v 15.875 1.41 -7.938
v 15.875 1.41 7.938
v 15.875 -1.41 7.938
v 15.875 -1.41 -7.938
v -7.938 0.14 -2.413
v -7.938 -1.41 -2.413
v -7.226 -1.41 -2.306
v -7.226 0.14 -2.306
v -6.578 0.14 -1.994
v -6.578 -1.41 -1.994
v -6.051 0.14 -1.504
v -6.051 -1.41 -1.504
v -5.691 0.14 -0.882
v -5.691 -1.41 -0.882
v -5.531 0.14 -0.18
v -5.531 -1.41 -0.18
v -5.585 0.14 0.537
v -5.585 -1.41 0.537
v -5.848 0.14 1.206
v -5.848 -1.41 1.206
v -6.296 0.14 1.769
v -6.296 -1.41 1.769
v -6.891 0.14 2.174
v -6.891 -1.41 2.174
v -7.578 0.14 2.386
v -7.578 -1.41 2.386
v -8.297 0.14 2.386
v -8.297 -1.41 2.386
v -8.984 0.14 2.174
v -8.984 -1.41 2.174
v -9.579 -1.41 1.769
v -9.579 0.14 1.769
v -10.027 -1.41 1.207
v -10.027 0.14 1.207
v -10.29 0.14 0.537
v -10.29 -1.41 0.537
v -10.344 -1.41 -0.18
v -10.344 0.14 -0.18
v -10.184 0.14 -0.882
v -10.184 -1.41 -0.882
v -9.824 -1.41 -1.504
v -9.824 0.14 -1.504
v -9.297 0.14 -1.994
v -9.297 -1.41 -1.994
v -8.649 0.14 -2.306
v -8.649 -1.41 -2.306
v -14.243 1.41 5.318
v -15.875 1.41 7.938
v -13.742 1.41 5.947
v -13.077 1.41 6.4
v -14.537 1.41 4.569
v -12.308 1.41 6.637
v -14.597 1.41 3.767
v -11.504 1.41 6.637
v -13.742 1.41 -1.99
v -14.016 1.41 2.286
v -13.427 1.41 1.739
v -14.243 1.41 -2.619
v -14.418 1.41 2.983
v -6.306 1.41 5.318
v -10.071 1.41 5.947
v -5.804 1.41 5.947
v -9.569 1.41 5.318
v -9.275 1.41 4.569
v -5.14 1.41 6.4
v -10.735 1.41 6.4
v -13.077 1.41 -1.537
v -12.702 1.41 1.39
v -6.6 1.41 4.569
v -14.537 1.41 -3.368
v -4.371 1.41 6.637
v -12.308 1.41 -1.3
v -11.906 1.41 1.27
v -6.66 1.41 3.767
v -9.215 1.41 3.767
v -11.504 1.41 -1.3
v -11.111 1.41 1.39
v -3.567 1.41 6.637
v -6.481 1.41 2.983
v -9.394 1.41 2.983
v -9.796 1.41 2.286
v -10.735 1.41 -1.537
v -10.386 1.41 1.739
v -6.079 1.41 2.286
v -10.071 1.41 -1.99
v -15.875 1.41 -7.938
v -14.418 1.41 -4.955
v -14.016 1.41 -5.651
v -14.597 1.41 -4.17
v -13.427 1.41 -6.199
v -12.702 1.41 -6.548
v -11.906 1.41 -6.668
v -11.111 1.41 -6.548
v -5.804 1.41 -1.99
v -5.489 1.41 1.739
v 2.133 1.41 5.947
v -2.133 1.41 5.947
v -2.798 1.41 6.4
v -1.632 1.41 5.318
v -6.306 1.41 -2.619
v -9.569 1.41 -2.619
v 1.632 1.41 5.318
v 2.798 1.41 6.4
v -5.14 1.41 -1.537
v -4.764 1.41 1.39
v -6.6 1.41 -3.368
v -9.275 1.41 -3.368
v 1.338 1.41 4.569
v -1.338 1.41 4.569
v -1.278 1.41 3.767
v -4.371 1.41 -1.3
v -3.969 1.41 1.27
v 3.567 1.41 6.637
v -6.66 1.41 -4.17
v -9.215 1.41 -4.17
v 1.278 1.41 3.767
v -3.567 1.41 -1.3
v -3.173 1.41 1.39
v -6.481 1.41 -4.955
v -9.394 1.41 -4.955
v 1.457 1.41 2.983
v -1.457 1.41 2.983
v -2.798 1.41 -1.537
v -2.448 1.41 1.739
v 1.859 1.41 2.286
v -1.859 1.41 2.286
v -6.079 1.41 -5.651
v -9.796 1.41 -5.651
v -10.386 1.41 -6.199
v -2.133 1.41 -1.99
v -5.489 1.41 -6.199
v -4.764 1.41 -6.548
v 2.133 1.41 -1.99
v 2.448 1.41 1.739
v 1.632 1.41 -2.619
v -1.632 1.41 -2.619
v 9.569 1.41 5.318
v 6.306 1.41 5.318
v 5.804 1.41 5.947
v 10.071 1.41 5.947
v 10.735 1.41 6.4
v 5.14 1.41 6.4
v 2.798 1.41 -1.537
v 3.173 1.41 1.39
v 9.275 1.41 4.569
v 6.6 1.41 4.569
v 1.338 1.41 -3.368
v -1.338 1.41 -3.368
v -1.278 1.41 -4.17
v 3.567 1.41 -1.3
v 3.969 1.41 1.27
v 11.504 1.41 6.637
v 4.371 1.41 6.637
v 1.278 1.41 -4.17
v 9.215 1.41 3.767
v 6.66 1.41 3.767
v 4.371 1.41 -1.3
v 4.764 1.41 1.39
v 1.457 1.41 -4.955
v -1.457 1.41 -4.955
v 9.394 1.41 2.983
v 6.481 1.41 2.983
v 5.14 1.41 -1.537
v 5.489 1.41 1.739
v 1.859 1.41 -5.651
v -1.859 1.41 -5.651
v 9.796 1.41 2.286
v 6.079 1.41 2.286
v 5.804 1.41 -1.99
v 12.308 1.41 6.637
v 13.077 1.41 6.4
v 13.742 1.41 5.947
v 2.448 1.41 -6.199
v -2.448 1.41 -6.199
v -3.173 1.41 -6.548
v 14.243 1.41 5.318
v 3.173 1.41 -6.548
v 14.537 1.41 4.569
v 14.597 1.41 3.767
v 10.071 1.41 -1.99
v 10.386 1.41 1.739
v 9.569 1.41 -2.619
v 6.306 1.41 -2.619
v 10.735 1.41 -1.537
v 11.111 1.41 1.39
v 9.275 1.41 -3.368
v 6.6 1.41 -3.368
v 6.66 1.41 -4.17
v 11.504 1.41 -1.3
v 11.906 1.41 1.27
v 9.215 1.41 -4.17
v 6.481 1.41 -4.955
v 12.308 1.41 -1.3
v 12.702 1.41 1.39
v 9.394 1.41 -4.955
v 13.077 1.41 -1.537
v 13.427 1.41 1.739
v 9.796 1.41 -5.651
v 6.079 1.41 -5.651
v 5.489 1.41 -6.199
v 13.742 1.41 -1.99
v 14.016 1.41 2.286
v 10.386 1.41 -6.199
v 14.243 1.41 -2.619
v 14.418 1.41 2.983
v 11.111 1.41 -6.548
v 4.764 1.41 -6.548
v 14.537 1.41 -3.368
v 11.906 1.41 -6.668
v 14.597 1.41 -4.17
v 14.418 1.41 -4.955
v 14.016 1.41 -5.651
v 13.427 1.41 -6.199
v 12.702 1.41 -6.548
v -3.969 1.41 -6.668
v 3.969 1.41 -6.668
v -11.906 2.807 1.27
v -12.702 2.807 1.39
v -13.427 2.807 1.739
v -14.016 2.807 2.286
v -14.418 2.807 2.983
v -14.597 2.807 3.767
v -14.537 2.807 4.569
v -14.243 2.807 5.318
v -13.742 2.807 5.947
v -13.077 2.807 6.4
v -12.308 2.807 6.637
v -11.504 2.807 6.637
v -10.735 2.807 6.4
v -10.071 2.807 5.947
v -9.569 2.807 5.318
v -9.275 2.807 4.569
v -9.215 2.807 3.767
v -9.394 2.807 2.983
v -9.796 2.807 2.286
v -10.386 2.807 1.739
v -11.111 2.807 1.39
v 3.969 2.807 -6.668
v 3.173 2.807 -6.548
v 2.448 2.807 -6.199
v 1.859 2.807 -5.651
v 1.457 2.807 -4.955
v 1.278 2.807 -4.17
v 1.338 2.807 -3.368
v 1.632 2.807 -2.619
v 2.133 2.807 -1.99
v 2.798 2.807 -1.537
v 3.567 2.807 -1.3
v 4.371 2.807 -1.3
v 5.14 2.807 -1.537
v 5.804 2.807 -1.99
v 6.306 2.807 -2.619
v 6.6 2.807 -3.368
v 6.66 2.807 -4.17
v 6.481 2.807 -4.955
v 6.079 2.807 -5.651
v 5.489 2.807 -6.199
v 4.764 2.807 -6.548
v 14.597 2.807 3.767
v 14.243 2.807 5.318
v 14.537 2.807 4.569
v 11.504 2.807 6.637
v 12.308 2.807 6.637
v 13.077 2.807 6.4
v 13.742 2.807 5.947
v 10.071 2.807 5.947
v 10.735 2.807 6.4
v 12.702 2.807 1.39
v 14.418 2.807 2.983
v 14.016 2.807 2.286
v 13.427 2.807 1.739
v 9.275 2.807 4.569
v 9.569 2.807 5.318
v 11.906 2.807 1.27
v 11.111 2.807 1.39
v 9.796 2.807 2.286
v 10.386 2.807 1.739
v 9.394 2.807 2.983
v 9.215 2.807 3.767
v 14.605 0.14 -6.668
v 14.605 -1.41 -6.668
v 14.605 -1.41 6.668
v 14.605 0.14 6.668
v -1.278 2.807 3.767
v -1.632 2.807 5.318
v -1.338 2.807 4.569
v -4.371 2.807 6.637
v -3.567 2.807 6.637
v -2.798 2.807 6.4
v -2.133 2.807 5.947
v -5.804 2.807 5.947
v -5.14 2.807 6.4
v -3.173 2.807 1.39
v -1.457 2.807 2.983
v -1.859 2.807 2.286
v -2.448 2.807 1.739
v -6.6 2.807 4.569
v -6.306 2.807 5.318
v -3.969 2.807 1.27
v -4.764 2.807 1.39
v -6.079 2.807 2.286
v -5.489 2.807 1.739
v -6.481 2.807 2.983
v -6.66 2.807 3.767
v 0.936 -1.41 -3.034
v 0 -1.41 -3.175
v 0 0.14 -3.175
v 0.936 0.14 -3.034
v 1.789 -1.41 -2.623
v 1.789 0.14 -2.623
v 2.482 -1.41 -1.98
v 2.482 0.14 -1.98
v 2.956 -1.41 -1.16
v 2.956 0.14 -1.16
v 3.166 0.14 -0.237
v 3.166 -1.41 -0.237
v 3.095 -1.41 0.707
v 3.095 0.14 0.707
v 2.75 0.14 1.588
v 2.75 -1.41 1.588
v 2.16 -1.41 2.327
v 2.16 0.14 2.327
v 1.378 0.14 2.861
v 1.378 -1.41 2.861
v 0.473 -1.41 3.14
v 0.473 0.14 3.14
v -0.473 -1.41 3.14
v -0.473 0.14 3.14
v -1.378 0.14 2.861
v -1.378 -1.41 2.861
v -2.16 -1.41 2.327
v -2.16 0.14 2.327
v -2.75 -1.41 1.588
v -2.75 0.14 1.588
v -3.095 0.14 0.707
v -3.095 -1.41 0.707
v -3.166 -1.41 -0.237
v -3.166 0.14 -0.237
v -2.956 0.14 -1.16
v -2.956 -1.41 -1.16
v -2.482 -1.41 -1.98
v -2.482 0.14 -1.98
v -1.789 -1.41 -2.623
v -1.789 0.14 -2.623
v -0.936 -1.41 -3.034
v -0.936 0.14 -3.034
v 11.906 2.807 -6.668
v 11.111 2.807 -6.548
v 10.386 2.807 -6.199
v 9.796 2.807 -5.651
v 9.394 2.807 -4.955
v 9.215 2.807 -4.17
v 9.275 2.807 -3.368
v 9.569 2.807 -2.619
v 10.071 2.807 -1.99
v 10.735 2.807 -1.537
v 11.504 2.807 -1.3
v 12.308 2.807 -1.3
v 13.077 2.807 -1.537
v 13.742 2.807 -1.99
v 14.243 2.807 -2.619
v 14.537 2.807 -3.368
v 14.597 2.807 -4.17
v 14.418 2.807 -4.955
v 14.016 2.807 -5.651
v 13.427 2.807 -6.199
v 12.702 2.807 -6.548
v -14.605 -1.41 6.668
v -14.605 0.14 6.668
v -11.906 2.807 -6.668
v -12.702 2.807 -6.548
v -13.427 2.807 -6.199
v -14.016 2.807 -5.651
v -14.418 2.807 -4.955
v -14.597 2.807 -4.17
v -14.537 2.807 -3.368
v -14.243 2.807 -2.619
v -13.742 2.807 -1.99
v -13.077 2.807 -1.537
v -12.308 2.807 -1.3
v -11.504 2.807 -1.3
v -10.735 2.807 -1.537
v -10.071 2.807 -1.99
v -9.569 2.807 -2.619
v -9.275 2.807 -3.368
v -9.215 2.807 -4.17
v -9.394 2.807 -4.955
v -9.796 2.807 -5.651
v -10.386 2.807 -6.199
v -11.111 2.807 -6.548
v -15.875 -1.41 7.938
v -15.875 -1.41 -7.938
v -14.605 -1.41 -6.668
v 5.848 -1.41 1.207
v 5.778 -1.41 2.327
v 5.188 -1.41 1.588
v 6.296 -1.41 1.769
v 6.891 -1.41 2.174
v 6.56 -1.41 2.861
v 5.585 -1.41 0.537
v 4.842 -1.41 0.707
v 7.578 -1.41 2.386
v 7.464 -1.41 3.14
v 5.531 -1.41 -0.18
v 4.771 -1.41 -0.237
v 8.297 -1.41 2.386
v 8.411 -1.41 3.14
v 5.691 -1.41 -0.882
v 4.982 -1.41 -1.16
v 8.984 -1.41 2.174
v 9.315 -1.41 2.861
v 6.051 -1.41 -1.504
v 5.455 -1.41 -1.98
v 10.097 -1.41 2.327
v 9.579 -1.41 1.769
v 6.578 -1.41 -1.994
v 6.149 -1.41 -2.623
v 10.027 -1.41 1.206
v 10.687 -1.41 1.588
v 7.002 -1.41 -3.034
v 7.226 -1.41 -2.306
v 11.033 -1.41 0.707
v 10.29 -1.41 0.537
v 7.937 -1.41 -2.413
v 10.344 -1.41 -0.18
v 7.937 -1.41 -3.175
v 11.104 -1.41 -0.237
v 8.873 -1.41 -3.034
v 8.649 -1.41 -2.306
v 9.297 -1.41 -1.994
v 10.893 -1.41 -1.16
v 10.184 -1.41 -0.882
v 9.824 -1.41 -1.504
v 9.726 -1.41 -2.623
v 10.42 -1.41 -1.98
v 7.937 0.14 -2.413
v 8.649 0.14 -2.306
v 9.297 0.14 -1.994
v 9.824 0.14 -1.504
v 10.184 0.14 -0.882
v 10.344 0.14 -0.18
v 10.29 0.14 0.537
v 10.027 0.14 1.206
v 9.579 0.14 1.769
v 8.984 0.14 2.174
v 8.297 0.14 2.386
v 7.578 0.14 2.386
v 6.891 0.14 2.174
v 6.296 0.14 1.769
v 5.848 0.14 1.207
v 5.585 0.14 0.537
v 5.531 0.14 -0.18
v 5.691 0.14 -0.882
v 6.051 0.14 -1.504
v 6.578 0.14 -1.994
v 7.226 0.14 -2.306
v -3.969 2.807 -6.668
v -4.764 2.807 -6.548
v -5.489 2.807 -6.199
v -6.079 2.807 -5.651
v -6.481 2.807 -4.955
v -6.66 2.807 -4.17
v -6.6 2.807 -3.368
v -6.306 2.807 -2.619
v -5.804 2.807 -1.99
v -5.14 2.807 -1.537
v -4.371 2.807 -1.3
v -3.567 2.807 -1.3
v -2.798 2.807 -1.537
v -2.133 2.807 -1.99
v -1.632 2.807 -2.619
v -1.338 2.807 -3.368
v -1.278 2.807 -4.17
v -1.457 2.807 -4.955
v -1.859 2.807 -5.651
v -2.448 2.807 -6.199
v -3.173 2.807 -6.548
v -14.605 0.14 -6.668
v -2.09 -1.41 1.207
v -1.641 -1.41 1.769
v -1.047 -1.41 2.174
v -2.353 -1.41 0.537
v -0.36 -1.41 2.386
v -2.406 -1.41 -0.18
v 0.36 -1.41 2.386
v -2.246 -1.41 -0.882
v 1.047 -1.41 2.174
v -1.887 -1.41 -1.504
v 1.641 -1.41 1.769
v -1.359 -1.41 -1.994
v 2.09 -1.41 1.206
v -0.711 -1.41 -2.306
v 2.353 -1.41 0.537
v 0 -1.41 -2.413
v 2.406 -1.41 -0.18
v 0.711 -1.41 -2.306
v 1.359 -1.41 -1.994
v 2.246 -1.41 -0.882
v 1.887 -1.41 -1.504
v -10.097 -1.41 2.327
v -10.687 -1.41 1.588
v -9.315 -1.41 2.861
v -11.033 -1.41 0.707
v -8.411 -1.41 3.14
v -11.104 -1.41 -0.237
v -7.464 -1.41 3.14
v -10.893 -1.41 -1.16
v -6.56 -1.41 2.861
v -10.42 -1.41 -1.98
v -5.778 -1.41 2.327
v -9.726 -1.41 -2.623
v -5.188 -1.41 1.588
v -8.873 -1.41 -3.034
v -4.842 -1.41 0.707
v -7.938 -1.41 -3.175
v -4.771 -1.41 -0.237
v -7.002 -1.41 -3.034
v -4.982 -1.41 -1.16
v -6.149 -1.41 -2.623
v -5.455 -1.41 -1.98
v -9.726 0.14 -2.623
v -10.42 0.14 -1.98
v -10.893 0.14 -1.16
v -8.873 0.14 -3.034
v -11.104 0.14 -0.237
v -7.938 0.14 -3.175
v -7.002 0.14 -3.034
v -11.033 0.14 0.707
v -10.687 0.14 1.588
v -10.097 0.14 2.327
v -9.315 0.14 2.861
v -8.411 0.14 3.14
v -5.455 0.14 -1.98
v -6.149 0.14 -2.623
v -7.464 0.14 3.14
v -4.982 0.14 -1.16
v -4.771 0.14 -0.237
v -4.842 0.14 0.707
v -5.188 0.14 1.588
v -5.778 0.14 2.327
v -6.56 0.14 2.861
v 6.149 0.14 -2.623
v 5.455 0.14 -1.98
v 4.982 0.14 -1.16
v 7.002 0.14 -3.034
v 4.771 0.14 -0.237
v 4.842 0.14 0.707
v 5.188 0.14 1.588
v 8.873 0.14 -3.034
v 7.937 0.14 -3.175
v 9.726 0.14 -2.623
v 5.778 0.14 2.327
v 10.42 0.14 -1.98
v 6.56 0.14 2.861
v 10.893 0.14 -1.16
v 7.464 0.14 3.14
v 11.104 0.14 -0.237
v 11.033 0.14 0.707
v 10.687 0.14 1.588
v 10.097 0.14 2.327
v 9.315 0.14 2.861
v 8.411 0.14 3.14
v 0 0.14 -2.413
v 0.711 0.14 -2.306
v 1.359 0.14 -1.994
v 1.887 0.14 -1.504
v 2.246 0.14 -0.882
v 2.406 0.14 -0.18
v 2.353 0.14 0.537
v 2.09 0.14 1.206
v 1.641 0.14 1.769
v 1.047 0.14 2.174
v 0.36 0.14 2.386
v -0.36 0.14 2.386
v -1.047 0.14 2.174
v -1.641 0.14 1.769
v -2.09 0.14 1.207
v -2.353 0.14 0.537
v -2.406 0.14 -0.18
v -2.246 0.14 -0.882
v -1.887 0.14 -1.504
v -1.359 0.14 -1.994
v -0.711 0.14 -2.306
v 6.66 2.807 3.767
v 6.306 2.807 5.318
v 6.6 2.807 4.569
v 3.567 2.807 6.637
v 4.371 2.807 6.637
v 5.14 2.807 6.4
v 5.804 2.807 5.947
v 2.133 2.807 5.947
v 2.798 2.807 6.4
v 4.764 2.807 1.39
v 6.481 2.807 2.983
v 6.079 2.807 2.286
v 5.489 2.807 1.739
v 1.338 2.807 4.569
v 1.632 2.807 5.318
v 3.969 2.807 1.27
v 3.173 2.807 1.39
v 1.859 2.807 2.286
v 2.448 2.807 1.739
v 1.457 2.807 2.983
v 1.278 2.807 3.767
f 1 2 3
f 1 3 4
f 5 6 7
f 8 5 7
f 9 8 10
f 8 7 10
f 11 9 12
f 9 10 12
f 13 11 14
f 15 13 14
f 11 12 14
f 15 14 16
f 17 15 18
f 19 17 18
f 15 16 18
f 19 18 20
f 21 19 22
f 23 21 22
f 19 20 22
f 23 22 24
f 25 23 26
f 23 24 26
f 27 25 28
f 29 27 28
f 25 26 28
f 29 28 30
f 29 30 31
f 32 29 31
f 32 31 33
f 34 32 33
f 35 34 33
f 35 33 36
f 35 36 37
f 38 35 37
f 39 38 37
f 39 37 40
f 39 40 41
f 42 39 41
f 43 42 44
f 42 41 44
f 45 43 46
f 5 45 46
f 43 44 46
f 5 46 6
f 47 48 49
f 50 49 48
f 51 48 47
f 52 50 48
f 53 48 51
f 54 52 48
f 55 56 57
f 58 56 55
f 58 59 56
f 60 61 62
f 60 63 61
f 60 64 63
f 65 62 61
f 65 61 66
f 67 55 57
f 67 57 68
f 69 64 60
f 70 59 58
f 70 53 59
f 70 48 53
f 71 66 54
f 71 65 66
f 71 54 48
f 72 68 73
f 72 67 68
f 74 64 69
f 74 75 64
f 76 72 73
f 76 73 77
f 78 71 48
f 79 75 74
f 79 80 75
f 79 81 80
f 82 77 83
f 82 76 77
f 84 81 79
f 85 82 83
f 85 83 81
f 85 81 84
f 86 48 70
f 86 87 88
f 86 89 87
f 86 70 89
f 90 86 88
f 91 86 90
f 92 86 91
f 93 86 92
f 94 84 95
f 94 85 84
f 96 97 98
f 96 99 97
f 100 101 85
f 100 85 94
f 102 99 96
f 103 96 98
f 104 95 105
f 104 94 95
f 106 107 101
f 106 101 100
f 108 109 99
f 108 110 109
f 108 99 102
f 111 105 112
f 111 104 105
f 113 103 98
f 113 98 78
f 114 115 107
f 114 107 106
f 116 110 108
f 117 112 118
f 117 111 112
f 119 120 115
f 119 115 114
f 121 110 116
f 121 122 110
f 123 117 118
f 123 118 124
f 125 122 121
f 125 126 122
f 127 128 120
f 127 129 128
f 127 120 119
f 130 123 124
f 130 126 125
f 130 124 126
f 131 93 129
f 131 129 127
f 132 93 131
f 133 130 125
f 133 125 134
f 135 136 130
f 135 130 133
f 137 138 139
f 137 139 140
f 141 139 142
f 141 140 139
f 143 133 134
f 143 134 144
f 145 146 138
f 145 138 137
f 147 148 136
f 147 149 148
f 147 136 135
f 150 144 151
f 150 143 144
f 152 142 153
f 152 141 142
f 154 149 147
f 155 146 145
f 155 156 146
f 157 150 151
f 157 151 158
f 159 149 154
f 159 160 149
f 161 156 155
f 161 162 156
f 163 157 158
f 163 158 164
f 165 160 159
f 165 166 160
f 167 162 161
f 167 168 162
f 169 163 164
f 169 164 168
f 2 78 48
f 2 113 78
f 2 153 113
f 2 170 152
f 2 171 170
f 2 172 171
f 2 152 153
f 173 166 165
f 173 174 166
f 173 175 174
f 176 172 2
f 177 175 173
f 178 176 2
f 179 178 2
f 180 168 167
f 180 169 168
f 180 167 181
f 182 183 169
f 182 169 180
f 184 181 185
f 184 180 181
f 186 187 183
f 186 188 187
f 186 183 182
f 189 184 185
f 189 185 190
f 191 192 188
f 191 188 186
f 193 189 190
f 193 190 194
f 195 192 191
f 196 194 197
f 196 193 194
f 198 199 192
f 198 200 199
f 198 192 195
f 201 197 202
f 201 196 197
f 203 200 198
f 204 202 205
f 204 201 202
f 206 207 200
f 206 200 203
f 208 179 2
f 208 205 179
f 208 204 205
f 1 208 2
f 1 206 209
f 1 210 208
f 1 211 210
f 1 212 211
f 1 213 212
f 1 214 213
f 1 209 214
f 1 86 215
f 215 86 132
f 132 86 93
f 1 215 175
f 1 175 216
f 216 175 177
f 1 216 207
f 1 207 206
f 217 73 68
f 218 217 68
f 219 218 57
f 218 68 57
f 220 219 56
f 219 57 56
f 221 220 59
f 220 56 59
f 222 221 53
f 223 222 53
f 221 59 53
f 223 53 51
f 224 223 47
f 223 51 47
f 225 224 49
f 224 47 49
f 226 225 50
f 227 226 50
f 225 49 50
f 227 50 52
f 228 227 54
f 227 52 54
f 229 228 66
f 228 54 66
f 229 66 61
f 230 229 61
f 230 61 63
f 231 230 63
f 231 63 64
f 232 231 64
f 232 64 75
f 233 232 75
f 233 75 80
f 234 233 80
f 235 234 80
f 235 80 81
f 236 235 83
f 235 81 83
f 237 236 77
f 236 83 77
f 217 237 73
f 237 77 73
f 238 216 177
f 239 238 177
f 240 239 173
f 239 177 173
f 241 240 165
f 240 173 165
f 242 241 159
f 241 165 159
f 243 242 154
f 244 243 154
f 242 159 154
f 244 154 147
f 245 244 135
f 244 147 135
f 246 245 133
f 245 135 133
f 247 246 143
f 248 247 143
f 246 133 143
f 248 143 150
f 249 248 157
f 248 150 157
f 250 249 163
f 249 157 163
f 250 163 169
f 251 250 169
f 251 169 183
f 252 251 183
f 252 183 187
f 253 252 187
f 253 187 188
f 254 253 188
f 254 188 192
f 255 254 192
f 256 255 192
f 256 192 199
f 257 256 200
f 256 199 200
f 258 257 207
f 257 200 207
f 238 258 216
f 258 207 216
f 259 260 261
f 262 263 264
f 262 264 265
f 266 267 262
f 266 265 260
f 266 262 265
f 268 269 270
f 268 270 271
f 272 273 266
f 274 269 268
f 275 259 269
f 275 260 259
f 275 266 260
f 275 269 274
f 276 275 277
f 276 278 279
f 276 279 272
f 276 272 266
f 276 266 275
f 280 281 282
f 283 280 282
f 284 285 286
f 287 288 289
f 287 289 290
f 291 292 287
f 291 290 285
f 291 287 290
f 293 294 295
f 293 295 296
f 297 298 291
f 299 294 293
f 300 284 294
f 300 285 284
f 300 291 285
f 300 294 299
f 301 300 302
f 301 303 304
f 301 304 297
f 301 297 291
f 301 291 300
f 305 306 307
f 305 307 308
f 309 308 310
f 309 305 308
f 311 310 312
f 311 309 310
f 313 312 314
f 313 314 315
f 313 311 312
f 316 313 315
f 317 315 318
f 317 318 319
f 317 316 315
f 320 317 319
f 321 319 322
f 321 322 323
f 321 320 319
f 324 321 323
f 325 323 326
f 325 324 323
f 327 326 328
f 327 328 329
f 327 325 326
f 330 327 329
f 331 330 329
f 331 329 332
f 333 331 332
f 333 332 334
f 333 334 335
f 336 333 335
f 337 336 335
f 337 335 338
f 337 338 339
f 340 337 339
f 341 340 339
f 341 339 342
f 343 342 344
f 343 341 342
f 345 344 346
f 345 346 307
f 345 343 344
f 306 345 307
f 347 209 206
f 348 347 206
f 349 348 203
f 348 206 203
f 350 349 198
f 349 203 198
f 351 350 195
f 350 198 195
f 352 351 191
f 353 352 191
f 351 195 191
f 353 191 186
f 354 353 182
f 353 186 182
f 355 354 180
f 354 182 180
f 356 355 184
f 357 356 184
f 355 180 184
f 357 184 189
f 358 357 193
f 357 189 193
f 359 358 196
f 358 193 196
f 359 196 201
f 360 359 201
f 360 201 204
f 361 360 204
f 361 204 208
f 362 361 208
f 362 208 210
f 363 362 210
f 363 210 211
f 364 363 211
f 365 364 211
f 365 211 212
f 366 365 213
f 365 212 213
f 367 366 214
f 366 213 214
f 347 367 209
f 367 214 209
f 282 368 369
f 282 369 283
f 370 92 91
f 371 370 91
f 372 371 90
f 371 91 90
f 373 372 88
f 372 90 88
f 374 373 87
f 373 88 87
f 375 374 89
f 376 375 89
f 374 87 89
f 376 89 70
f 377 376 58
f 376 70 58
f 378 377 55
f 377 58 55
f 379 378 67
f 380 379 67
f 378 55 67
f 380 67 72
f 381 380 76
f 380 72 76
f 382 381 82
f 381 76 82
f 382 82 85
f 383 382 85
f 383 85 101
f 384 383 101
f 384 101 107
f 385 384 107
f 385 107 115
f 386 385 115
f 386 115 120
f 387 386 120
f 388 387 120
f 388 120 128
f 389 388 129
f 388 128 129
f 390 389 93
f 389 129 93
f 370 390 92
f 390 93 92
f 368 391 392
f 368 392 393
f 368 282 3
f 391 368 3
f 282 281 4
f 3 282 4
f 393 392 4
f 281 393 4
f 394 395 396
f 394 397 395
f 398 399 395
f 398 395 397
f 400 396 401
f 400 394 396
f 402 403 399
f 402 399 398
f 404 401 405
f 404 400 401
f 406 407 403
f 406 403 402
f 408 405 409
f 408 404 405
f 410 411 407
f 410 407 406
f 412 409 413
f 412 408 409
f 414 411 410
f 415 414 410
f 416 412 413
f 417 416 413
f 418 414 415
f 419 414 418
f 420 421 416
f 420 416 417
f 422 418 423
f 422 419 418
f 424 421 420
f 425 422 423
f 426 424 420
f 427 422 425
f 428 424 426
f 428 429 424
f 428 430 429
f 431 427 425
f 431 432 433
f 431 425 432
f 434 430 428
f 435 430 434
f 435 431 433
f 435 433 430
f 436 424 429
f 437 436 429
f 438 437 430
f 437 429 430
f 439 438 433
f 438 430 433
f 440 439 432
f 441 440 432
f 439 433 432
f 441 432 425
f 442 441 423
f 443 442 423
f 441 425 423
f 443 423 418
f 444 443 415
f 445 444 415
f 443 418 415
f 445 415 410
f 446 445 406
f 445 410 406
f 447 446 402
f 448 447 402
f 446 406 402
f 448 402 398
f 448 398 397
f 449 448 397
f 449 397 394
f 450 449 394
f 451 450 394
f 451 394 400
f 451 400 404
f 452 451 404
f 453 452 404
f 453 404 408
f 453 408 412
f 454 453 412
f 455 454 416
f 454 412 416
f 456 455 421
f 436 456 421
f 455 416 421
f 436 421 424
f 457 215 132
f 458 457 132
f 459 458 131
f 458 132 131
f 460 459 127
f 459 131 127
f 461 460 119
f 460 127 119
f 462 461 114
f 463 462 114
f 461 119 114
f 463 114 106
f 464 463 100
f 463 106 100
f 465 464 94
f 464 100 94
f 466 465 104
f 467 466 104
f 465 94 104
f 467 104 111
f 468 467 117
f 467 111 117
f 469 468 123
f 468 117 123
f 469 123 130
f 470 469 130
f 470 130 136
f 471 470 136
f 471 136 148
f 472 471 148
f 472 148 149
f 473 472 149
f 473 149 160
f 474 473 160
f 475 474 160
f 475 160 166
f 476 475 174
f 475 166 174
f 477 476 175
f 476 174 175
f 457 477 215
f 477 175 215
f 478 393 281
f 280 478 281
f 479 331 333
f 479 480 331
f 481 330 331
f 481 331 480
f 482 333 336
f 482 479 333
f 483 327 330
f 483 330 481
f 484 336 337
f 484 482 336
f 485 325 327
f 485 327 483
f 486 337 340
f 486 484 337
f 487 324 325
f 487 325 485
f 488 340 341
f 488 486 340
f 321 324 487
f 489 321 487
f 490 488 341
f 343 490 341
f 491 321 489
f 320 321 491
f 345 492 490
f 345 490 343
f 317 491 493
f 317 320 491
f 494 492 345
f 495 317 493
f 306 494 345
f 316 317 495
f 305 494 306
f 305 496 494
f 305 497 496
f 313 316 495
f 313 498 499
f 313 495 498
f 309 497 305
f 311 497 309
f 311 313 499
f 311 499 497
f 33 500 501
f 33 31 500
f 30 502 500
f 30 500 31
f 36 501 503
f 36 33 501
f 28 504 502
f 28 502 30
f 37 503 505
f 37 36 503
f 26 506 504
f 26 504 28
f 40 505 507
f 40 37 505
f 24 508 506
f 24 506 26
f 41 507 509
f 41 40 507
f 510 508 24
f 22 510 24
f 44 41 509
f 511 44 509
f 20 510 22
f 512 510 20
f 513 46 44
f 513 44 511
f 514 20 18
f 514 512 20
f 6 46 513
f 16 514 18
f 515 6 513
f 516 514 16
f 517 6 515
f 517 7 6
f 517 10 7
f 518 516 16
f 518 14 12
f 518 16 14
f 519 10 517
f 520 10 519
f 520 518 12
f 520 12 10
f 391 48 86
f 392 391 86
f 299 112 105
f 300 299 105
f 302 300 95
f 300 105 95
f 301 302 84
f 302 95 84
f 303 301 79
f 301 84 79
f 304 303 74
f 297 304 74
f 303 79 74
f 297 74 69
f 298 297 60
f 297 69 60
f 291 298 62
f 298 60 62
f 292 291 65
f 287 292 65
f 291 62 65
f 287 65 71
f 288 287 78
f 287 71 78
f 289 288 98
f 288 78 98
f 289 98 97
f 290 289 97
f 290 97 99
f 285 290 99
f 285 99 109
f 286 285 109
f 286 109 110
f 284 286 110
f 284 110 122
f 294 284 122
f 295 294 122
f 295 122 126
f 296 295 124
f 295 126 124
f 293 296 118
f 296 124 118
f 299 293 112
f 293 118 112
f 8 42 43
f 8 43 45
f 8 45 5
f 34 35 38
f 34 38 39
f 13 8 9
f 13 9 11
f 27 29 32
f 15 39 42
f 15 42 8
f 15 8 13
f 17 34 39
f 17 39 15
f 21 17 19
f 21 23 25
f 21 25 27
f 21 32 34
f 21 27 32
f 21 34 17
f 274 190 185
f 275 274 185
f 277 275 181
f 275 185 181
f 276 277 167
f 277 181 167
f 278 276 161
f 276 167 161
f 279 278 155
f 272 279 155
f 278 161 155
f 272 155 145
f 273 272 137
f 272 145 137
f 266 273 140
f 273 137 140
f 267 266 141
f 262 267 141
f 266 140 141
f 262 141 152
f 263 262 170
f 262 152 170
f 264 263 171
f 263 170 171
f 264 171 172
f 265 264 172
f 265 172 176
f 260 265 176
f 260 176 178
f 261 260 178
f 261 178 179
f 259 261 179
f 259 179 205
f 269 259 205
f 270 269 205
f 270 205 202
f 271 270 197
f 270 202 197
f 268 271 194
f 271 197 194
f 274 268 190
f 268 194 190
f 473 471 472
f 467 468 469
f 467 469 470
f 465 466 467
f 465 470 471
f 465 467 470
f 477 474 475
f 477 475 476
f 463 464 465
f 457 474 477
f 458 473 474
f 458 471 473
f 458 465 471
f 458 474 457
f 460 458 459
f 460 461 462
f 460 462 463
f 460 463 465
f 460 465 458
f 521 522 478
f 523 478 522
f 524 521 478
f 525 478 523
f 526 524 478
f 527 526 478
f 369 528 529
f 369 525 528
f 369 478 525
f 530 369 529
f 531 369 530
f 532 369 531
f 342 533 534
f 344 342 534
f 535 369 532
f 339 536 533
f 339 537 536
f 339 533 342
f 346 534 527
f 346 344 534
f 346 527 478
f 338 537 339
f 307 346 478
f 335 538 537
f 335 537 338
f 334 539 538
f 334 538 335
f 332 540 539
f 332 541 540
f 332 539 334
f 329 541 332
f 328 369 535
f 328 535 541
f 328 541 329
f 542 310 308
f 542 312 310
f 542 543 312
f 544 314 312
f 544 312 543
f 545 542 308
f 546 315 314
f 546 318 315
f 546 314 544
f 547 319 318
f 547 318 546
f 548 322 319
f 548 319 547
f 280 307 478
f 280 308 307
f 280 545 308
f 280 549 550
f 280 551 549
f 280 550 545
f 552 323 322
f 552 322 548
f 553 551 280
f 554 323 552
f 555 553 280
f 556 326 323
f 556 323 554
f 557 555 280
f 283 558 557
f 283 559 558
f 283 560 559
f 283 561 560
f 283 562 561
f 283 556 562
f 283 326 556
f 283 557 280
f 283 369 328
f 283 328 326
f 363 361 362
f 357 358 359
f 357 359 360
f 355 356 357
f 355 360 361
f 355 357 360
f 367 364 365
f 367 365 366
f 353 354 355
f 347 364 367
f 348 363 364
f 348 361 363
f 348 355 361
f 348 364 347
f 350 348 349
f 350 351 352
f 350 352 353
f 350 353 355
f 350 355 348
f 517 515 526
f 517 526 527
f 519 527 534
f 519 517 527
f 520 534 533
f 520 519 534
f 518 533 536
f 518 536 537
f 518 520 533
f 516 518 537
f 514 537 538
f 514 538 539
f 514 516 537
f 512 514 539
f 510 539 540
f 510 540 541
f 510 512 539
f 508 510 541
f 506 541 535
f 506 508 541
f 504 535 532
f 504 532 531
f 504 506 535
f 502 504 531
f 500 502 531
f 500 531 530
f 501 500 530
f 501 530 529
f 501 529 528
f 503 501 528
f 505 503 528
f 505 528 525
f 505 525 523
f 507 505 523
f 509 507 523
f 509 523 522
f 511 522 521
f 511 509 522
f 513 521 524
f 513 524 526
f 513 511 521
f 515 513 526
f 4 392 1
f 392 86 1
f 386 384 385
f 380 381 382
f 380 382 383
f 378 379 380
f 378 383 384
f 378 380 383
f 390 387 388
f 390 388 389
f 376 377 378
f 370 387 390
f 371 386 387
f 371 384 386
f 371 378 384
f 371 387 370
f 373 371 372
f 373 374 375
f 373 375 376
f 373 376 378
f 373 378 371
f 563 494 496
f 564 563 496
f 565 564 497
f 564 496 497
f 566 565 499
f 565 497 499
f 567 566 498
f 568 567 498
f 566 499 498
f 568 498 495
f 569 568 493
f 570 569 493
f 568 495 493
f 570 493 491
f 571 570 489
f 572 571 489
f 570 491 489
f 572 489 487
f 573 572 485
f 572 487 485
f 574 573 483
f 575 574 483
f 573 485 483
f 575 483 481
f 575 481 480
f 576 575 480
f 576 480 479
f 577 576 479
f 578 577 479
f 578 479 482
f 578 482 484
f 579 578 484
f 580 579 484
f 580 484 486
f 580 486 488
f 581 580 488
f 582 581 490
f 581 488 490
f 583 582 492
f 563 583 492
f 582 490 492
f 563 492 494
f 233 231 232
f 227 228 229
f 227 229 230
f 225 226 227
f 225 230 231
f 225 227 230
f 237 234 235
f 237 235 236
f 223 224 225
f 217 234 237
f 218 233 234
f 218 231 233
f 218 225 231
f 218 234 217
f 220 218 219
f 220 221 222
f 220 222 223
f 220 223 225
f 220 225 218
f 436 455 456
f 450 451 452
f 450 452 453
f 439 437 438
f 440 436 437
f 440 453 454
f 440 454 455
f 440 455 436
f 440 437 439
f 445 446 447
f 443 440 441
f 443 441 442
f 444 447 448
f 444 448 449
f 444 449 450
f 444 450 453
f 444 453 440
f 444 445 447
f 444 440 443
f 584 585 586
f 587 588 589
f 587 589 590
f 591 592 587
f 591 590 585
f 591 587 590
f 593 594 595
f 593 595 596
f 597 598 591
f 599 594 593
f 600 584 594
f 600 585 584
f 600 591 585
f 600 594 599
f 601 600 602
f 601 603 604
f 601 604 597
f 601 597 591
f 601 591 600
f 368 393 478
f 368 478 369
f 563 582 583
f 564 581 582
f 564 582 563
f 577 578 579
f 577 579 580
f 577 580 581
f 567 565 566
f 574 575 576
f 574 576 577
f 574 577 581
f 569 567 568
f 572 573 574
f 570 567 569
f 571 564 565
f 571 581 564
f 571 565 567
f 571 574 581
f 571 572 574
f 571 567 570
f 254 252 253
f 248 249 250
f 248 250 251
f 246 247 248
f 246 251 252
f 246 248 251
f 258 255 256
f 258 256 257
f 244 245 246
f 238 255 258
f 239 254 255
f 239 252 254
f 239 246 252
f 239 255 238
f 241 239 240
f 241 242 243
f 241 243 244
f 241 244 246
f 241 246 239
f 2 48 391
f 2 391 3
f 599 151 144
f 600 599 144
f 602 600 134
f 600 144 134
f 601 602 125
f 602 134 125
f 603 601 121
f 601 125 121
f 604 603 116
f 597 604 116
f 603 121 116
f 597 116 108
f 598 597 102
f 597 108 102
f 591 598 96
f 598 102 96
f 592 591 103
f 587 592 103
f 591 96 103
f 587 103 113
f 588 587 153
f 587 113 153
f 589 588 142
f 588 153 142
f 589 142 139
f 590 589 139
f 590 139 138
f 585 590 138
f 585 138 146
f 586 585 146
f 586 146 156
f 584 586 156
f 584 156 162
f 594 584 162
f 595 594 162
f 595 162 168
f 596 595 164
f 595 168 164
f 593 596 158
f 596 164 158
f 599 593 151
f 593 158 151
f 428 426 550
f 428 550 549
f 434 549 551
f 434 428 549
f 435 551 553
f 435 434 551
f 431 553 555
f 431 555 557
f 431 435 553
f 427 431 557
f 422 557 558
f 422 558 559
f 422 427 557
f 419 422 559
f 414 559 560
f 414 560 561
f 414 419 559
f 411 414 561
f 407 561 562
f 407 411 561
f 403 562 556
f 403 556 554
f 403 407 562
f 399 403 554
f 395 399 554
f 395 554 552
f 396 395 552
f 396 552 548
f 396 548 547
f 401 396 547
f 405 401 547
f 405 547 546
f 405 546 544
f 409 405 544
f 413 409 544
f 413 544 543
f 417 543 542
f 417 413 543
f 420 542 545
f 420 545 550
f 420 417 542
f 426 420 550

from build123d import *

# Parameters (mm, degrees)
SKETCH1_W            = 31.75
SKETCH1_H            = 15.875
BOSS_EXTRUDE1_DEPTH  = 1.4097
SKETCH2_W            = 29.21
SKETCH2_H            = 13.335
SKETCH2_R            = 3.175
SKETCH2_R_2          = 2.413
CUT_EXTRUDE1_DEPTH   = 1.5494
SKETCH3_R            = 2.69875
BOSS_EXTRUDE2_DEPTH  = 1.397
LPATTERN1_COUNT      = 4
LPATTERN1_PITCH      = 7.9375
LPATTERN1_COUNT_DIR2 = 2
LPATTERN1_PITCH_DIR2 = 7.9375
SKETCH2_3_R          = 3.175
SKETCH2_3_R_2        = 2.413
BOSS_EXTRUDE3_DEPTH  = 1.5494
LPATTERN2_COUNT      = 2
LPATTERN2_PITCH      = 7.9375
LPATTERN2_COL_COUNT  = 2
LPATTERN2_COL_PITCH  = 7.9375


with BuildPart() as part:
    # Sketch1 → Boss-Extrude1 (new, symmetric)
    with BuildSketch(Plane(origin=(0, 0, 0), x_dir=(1, 0, 0), z_dir=(0, 1, 0))):
        Rectangle(SKETCH1_W, SKETCH1_H)
    extrude(amount=BOSS_EXTRUDE1_DEPTH, both=True)

    # Sketch2 → Cut-Extrude1 (cut)
    with BuildSketch(Plane.XZ.offset(1.4097)):
        Rectangle(SKETCH2_W, SKETCH2_H)
        Circle(SKETCH2_R, mode=Mode.SUBTRACT)
        Circle(SKETCH2_R)
        Circle(SKETCH2_R_2, mode=Mode.SUBTRACT)
        Circle(SKETCH2_R_2)
    extrude(amount=-CUT_EXTRUDE1_DEPTH, mode=Mode.SUBTRACT)

    # Sketch3 → Boss-Extrude2 (add)
    with BuildSketch(Plane(origin=(0, 1.4097, 0), x_dir=(1, 0, 0), z_dir=(0, 1, 0))):
        with Locations(Location((11.90625, -3.96875, 0), (0, 0, 90))):
            Circle(SKETCH3_R)
    boss_extrude2 = extrude(amount=BOSS_EXTRUDE2_DEPTH)

    # LPattern1: Boss-Extrude2 4 × 2
    with Locations(*[(-i * LPATTERN1_PITCH, 0, -j * LPATTERN1_PITCH_DIR2) for i in range(LPATTERN1_COUNT) for j in range(LPATTERN1_COUNT_DIR2) if (i, j) != (0, 0)]):
        add(boss_extrude2)

    # Sketch2<3> → Boss-Extrude3 (add)
    with BuildSketch(Plane.XZ.offset(1.4097)):
        with Locations(Location((0, 0, 0), (0, 0, 270))):
            Circle(SKETCH2_3_R)
        with Locations(Location((0, 0, 0), (0, 0, 270))):
            Circle(SKETCH2_3_R_2, mode=Mode.SUBTRACT)
    boss_extrude3 = extrude(amount=-BOSS_EXTRUDE3_DEPTH)

    # LPattern2: Boss-Extrude3 ×2
    with Locations(*[(i * LPATTERN2_PITCH, 0, 0) for i in range(1, LPATTERN2_COUNT)]):
        add(boss_extrude3)

    # LPattern2 col: Boss-Extrude3 ×2
    with Locations(*[(-i * LPATTERN2_COL_PITCH, 0, 0) for i in range(1, LPATTERN2_COL_COUNT)]):
        add(boss_extrude3)


solid = part.part
